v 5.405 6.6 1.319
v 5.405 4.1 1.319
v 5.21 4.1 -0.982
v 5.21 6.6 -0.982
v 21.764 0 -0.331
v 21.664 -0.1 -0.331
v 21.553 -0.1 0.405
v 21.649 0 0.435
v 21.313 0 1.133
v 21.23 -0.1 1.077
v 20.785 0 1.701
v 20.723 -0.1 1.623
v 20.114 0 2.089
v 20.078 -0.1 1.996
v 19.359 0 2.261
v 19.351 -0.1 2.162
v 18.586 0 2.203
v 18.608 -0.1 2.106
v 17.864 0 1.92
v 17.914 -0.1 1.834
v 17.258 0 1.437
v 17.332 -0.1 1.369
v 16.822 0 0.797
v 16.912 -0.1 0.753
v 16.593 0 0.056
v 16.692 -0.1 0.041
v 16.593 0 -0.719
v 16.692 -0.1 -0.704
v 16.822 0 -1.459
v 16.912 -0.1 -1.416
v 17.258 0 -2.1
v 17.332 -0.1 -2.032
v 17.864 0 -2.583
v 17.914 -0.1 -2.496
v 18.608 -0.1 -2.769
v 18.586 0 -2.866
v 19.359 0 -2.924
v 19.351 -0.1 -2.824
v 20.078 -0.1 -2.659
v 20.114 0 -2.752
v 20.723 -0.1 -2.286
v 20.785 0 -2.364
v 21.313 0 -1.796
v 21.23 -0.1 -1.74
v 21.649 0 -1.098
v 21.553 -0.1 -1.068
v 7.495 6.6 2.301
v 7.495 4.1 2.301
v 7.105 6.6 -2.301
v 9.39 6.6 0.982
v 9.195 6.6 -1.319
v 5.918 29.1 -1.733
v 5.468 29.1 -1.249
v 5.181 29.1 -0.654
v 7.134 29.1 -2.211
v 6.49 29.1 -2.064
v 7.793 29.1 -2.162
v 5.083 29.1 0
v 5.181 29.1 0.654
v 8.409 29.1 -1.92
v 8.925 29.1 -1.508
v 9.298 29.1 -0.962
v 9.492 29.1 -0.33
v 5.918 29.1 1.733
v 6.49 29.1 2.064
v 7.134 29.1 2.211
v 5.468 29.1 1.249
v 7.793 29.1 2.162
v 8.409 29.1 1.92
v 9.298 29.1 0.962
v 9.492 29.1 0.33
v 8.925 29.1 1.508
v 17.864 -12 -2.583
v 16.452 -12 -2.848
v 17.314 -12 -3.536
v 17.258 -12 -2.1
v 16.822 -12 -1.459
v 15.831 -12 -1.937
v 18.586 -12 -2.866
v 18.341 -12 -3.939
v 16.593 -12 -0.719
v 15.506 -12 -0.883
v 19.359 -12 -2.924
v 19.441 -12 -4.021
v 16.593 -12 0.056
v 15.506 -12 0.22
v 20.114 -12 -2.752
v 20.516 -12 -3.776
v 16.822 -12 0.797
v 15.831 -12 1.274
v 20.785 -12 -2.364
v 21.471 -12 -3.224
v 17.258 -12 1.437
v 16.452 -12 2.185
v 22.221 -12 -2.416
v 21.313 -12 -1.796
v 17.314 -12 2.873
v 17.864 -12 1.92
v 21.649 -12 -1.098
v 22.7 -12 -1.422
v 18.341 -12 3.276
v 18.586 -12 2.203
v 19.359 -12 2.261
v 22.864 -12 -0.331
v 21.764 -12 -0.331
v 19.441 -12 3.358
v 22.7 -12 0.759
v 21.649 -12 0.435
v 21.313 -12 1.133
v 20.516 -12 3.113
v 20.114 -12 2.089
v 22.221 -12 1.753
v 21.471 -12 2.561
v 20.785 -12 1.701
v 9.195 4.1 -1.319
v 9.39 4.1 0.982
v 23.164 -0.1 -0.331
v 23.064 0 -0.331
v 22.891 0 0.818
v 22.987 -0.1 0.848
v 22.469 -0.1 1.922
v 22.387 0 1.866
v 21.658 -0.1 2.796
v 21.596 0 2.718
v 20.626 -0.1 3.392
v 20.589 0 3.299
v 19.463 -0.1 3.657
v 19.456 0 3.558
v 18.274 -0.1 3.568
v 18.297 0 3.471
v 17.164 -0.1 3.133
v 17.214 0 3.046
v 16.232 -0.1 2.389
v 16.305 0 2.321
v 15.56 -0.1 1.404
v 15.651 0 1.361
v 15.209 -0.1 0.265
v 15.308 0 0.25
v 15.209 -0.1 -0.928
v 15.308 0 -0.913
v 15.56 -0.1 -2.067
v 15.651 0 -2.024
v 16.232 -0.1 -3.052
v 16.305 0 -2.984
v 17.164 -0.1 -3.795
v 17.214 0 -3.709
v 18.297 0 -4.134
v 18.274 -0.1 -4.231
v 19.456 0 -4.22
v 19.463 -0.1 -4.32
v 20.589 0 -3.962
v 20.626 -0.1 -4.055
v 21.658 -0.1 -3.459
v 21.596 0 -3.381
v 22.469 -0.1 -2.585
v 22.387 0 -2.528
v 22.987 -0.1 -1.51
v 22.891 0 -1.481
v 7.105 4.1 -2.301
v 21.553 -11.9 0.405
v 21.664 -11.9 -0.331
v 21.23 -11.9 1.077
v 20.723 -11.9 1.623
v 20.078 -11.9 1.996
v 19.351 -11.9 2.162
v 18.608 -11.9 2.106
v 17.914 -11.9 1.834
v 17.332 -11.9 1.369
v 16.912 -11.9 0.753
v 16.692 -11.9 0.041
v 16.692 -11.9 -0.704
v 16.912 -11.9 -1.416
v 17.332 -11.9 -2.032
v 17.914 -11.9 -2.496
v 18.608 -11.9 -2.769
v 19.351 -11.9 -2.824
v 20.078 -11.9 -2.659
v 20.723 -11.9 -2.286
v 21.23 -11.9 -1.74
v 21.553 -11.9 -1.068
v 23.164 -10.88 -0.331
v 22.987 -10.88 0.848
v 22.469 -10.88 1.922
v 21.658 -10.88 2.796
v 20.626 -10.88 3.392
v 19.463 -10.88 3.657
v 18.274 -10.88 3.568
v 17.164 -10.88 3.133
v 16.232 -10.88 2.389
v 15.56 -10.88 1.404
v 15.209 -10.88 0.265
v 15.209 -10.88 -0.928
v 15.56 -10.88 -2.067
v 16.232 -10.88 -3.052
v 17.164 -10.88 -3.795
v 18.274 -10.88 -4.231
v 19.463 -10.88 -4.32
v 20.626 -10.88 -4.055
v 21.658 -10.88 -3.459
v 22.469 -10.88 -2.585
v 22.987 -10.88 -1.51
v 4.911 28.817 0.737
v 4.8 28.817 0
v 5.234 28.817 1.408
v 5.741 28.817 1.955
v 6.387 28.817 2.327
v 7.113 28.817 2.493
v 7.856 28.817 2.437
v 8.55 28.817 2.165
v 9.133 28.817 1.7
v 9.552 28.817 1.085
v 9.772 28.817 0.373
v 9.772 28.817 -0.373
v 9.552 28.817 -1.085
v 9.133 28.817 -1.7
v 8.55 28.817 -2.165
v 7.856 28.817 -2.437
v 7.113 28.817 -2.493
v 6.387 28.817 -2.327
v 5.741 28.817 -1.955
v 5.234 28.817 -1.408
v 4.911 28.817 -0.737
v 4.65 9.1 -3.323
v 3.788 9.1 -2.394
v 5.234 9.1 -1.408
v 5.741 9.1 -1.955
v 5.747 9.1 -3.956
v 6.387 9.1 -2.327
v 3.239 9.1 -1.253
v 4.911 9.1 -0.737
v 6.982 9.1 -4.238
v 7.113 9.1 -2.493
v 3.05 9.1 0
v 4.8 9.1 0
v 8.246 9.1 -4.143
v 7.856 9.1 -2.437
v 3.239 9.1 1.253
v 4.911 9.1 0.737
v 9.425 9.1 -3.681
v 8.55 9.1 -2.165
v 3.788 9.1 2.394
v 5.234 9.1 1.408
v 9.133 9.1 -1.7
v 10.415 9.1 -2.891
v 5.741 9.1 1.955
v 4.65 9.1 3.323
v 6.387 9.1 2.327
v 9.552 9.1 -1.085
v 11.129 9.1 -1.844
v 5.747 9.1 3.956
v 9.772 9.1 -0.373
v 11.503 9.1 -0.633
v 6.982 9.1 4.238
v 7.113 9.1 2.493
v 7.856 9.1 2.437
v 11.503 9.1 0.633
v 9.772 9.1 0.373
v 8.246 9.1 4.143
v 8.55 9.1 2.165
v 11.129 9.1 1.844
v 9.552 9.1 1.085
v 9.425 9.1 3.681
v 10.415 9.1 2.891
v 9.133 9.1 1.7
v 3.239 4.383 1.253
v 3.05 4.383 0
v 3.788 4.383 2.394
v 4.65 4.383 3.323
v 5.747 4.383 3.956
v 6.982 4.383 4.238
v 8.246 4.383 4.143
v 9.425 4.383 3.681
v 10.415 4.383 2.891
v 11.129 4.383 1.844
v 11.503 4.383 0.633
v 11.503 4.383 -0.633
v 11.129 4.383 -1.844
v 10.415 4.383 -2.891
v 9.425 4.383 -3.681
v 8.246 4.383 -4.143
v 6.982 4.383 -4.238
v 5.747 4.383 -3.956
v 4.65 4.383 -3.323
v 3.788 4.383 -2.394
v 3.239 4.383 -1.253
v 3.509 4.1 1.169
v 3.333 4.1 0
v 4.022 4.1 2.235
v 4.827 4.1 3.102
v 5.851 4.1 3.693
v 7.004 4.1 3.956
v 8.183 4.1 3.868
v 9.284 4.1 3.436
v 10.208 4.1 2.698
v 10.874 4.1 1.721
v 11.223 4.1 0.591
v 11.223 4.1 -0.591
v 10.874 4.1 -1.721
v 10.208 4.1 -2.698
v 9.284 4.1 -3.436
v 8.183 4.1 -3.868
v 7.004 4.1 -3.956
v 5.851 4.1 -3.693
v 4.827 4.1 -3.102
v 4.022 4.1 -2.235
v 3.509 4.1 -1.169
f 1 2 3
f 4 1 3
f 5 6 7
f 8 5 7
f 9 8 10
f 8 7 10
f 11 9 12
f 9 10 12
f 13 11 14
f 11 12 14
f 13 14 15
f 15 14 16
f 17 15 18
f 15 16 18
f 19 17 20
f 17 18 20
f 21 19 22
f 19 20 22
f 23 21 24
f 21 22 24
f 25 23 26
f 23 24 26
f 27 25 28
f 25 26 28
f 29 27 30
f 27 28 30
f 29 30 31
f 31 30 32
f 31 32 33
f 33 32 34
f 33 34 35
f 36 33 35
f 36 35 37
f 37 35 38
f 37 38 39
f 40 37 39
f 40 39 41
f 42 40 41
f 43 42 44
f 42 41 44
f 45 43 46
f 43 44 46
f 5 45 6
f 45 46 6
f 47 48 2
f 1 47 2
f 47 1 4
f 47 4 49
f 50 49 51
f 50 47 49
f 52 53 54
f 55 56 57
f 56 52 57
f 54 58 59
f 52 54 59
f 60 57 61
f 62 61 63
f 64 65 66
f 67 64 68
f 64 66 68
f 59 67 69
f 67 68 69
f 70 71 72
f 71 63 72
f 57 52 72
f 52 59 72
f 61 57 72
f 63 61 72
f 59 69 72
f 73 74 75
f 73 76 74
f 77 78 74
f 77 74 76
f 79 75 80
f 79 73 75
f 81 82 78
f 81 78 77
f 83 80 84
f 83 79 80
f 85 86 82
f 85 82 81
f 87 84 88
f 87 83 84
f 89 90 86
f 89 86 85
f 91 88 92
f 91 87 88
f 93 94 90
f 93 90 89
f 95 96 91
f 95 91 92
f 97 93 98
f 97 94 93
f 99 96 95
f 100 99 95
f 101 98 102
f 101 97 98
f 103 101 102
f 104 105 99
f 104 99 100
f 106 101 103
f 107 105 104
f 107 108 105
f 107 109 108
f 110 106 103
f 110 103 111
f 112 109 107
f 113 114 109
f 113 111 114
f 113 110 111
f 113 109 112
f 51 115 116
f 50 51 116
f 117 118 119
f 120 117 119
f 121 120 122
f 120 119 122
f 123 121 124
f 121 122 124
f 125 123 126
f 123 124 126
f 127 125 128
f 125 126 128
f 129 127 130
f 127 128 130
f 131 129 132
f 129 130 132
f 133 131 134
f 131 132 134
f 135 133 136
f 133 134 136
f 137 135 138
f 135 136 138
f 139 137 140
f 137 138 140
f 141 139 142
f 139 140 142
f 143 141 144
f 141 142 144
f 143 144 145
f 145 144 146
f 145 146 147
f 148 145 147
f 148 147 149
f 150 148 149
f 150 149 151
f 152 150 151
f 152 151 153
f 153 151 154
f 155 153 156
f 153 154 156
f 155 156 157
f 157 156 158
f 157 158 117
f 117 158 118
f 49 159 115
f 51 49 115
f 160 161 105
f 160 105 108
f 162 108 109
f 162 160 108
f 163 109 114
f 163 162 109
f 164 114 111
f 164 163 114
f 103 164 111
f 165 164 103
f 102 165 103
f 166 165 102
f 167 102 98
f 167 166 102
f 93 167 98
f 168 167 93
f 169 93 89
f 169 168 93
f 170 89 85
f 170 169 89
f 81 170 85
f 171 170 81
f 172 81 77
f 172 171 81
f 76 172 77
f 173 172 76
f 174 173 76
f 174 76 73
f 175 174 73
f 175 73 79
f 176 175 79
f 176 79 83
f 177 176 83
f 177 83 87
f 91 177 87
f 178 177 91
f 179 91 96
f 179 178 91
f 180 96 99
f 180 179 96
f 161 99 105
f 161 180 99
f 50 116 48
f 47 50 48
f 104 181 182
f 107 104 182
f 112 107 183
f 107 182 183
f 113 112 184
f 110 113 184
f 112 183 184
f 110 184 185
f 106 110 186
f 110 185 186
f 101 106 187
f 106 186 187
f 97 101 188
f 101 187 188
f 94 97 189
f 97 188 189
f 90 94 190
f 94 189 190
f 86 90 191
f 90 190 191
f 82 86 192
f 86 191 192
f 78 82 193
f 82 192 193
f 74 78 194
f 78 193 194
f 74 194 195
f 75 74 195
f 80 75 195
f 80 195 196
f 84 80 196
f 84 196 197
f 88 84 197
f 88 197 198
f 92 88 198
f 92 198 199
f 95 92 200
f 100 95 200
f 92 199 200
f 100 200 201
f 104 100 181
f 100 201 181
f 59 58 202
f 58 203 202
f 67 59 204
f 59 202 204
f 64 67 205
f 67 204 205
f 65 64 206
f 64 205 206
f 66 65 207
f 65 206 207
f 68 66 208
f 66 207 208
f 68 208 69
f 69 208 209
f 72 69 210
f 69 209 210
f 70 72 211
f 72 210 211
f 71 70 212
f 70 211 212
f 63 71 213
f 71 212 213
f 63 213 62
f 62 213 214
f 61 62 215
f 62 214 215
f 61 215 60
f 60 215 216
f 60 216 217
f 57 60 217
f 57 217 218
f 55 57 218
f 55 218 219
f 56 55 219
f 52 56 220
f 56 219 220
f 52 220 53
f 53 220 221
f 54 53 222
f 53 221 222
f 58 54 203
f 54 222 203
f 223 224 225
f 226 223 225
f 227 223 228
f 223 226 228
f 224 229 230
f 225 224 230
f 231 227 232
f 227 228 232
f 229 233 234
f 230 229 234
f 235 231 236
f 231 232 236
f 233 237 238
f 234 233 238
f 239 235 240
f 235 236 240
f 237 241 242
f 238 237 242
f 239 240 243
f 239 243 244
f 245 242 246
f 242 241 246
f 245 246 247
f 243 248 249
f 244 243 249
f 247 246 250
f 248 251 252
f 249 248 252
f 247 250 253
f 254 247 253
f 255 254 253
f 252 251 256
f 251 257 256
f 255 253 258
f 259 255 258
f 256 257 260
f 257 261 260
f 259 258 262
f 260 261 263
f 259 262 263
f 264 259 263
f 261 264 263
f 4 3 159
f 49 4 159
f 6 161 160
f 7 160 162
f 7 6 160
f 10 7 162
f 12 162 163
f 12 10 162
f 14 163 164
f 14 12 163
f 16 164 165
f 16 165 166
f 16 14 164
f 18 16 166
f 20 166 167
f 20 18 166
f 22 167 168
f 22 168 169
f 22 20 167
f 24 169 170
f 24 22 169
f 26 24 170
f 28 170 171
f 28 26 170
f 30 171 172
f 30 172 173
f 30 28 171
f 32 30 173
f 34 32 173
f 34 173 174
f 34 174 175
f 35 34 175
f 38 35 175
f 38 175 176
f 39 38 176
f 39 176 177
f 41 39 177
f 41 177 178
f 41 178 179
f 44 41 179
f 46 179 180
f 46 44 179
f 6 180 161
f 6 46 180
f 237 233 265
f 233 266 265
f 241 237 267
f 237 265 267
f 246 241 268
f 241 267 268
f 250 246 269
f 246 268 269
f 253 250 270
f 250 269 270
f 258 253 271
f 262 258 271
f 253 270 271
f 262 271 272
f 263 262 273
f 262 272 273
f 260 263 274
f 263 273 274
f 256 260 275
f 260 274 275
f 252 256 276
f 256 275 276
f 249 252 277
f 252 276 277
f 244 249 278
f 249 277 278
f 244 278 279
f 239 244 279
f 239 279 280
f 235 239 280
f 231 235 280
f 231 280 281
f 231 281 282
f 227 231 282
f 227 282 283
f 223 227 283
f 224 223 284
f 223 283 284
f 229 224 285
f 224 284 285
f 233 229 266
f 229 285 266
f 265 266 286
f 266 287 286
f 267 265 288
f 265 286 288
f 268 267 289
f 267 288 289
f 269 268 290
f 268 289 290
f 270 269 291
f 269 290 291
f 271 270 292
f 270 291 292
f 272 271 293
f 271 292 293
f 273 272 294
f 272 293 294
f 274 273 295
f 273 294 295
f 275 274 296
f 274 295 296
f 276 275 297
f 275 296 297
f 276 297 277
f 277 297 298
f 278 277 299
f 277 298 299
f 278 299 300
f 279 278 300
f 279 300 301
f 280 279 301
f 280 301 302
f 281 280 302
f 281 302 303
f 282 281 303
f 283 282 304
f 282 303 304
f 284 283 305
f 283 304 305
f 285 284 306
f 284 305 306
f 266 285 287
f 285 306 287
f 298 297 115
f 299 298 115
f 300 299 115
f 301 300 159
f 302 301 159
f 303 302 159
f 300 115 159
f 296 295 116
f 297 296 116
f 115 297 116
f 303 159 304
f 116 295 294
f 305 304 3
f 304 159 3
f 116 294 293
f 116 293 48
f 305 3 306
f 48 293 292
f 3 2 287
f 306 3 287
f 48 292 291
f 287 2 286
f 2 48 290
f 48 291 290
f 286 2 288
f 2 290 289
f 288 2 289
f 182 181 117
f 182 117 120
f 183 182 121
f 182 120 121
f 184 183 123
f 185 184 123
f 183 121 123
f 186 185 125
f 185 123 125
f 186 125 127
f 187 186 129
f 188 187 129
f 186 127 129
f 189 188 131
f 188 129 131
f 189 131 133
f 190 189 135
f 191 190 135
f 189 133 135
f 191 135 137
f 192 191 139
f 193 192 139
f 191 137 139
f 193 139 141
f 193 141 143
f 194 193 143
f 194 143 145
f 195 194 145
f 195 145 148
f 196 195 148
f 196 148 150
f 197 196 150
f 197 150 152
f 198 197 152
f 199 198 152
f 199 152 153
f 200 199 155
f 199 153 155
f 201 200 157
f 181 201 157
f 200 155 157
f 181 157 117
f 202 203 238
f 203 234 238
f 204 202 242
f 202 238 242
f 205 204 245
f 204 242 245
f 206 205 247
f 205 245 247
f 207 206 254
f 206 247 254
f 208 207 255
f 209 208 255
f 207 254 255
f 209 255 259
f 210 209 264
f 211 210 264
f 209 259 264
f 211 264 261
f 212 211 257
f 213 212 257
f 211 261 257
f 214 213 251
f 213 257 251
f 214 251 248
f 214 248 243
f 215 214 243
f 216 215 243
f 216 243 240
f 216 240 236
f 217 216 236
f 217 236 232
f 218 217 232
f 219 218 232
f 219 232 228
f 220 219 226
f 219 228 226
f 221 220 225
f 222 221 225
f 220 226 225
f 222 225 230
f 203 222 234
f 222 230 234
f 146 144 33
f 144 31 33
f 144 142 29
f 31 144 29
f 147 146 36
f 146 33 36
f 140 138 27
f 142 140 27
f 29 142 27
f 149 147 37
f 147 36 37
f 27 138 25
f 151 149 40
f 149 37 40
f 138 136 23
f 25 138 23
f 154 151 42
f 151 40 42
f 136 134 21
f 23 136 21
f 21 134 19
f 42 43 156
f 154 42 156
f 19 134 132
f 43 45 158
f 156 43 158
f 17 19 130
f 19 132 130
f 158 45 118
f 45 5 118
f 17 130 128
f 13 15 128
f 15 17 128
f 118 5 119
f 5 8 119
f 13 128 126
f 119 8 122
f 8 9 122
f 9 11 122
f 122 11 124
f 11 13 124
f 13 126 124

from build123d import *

# Parameters (mm, degrees)
F3_DEPTH = 2.5
F4_R     = 4
F4_R_2   = 2.5
F5_DEPTH = 12
F6_SIZE2 = 1.1196152423
F6_SIZE  = 0.3
F7_SIZE  = 0.1


with BuildPart() as f1:
    # F0 (on Top) → F1 (revolve)
    with BuildSketch(Plane.XY):
        Polygon((4.8000001721, 9.1000000201), (3.0500001721, 9.1000000201), (3.0500001721, 4.3828427326), (3.3328428846, 4.1000000201), (7.3000001721, 4.1000000201), (7.3000001721, 9.1000000201), (7.3000001721, 29.1000000201), (5.0828428846, 29.1000000201), (4.8000001721, 28.8171573076), align=None)
    revolve(axis=Axis((7.3000001721, 19.1000000201, 0), (0, 1, 0)))

    # F2 (on face) → F3 (cut)
    with BuildSketch(Plane.XZ.offset(-4.1000000201)):
        Polygon((9.390368806, 0.9816783118), (7.4950261327, 2.3011514961), (5.4046574988, 1.3194731844), (5.2096315382, -0.9816783118), (7.1049742115, -2.3011514961), (9.1953428454, -1.3194731844), align=None)
    extrude(amount=-F3_DEPTH, mode=Mode.SUBTRACT)


with BuildPart() as f5:
    # F4 (on Front) → F5 (new body)
    with BuildSketch(Plane.XZ):
        with Locations((19.1643424332, -0.3313947527)):
            Circle(F4_R)
        with Locations((19.1643424332, -0.3313947527)):
            Circle(F4_R_2, mode=Mode.SUBTRACT)
    extrude(amount=F5_DEPTH)

    # F6
    f6_edges = [f5.edges().sort_by_distance(p)[0] for p in [
        (15.164342, -12, -0.331395),
    ]]
    f6_side = f5.faces().sort_by_distance((15.27748, -12, -0.331395))[0]
    chamfer(f6_edges, length=F6_SIZE, length2=F6_SIZE2, reference=f6_side)

    # F7
    f7_edges = [f5.edges().sort_by_distance(p)[0] for p in [
        (15.164342, 0, -0.331395),
        (16.664342, 0, -0.331395),
        (16.664342, -12, -0.331395),
    ]]
    chamfer(f7_edges, length=F7_SIZE)


solid = Compound([f1.part, f5.part])
